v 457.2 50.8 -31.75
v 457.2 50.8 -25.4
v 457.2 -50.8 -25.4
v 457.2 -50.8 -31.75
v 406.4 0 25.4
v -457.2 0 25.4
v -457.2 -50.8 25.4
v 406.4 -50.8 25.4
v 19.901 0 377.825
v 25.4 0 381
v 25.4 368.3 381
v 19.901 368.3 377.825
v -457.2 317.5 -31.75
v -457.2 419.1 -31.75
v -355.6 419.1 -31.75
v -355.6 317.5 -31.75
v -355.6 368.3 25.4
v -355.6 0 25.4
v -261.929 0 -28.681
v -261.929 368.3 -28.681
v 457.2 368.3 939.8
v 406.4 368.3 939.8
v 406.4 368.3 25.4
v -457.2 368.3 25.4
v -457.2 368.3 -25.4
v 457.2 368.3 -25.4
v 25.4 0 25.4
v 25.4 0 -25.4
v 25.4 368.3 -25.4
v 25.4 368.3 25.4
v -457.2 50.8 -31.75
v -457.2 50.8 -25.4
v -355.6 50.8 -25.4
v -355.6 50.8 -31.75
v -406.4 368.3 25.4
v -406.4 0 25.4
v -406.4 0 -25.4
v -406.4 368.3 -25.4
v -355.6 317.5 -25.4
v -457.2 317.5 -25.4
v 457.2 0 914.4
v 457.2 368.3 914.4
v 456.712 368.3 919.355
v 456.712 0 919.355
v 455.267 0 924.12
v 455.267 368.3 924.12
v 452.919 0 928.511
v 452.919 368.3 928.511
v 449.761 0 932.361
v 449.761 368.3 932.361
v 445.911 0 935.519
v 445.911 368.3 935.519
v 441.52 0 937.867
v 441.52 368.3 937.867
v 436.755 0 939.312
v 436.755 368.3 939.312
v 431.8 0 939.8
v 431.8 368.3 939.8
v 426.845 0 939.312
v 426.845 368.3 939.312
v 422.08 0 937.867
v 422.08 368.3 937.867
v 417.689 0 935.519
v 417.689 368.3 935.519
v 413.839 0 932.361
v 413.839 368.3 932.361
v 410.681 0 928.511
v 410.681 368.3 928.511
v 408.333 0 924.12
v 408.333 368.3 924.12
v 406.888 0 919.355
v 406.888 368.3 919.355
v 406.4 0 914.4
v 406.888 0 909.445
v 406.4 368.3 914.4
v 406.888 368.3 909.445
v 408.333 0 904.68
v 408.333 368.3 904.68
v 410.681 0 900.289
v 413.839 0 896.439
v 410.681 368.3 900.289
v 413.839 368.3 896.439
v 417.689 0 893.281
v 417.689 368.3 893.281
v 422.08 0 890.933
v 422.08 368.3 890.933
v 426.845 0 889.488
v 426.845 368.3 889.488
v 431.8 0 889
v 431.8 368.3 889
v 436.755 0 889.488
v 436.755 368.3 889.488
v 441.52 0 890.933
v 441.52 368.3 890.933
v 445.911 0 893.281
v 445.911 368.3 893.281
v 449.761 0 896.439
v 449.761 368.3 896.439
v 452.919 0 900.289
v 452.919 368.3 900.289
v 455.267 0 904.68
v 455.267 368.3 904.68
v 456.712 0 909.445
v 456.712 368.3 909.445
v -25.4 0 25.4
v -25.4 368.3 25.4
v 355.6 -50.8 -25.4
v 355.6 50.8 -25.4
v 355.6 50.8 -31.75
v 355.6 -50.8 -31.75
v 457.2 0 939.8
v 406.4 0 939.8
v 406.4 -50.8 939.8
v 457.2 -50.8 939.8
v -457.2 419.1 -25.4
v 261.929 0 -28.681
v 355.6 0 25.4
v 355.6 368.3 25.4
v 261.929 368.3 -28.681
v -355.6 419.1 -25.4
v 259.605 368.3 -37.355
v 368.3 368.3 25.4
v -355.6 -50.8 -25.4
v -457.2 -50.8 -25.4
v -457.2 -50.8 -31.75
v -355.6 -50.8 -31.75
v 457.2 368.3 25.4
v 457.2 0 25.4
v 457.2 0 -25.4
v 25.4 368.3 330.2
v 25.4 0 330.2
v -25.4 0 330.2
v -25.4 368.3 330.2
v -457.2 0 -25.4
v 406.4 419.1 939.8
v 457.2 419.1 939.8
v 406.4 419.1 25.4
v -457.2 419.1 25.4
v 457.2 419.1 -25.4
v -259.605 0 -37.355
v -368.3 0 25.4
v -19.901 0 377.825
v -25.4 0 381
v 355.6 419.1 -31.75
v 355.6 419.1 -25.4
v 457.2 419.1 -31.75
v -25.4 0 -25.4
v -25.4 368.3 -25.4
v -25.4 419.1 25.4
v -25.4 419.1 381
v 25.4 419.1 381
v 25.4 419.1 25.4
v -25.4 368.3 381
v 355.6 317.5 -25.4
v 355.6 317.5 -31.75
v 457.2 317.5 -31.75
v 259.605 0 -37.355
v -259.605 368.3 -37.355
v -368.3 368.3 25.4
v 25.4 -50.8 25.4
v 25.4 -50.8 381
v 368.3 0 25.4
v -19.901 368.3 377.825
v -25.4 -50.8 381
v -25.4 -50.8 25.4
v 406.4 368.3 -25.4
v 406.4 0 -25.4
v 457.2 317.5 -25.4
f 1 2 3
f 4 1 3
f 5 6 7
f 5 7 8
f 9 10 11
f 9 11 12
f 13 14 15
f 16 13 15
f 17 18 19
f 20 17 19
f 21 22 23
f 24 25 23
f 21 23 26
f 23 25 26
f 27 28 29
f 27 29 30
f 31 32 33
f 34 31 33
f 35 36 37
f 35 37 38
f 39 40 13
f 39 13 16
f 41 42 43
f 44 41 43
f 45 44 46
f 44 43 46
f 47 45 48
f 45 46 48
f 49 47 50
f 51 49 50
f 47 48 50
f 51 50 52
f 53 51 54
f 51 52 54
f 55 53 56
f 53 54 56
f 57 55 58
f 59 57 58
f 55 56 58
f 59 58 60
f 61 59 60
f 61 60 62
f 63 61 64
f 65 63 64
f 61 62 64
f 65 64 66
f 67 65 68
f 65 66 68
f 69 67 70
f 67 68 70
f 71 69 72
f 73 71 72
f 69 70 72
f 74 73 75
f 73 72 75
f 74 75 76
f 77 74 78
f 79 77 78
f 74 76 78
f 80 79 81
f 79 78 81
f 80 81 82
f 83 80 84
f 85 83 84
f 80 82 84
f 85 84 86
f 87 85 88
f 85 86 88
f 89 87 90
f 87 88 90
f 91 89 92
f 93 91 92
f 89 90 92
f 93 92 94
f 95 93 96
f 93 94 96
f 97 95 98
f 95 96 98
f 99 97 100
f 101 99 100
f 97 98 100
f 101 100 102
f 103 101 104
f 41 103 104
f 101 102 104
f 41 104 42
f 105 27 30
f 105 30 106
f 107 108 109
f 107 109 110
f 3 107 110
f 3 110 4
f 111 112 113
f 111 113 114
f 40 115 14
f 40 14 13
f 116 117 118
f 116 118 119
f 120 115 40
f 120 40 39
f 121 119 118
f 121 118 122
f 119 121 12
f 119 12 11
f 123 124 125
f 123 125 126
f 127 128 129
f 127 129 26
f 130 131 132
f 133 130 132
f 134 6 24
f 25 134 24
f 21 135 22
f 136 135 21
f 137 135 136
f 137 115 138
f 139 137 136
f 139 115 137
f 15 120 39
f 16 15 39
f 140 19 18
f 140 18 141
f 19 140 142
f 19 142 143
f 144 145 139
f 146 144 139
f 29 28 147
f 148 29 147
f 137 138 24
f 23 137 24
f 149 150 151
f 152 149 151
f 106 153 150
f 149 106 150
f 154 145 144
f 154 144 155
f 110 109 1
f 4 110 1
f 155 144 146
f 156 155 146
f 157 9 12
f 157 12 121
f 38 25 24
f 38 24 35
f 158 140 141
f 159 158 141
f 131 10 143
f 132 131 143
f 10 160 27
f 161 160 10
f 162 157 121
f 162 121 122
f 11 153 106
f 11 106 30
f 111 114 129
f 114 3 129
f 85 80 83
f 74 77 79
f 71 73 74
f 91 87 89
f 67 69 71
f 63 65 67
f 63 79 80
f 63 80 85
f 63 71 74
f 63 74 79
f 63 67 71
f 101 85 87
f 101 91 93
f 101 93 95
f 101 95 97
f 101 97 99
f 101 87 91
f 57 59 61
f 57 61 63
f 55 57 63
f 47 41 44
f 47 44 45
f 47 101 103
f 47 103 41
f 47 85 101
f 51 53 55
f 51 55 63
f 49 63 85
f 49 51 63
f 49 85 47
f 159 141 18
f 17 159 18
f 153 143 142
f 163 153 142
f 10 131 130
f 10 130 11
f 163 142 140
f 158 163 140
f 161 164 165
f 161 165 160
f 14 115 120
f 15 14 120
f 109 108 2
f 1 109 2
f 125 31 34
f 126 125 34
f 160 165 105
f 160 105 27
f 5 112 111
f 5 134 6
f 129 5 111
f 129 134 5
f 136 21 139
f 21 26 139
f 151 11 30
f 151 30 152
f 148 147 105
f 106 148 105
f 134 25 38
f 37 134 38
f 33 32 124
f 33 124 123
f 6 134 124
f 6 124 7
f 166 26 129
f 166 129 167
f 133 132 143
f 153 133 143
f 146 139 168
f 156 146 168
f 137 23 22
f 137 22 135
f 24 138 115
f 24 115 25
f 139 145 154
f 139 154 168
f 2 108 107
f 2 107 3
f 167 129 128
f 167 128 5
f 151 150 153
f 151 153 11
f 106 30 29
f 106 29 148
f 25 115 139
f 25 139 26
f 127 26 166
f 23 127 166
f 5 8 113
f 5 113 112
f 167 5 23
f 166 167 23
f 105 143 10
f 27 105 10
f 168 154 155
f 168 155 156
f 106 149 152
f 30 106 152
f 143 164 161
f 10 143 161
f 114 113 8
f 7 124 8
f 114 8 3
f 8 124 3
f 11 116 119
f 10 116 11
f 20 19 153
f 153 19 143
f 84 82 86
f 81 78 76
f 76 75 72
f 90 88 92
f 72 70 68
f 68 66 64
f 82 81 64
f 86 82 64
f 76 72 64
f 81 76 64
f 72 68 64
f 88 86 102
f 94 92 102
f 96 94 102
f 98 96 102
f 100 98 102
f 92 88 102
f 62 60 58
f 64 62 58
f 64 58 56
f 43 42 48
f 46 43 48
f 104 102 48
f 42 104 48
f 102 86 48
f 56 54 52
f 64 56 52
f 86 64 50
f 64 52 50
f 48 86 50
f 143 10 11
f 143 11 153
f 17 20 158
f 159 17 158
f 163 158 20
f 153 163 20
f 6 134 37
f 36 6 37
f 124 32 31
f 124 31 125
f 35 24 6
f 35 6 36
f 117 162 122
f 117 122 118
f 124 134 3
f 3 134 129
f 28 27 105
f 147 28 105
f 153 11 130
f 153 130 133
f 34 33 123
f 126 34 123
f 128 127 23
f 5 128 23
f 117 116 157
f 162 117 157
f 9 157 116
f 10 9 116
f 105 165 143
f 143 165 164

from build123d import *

# Parameters (mm, degrees)
F0_W      = 914.4
F0_H      = 50.8
F1_DEPTH  = 50.8
F2_W      = 50.8
F2_H      = 355.6
F3_DEPTH  = 50.8
F5_DEPTH  = 368.3
F6_W      = 50.8
F6_H      = 368.3
F7_DEPTH  = 50.8
F8_W      = 50.8
F8_H      = 50.8
F9_DEPTH  = 914.4
F10_W     = 50.8
F10_H     = 50.8
F11_DEPTH = 368.3
F12_W     = 50.8
F12_H     = 50.8
F13_DEPTH = 368.3
F14_W     = 50.8
F14_H     = 50.8
F15_DEPTH = 355.6
F17_W     = 50.8
F17_H     = 50.8
F18_DEPTH = 914.4
F19_W     = 50.8
F19_H     = 50.8
F20_DEPTH = 914.4
F21_R     = 25.4
F22_DEPTH = 368.3
F23_W     = 101.6
F23_H     = 101.6
F24_DEPTH = 6.35
F25_W     = 101.6
F25_H     = 101.6
F26_DEPTH = 6.35


with BuildPart() as f1:
    # F0 (on Front) → F1 (new body)
    with BuildSketch(Plane.XZ):
        Rectangle(F0_W, F0_H)
    extrude(amount=F1_DEPTH)

    # F17 (on face) → F18 (join)
    with BuildSketch(Plane.XY.offset(25.4)):
        with Locations((431.8, -25.4)):
            Rectangle(F17_W, F17_H)
    extrude(amount=F18_DEPTH)


with BuildPart() as f3:
    # F2 (on face) → F3 (new body)
    with BuildSketch(Plane.XZ.offset(50.8)):
        with Locations((0, 203.2)):
            Rectangle(F2_W, F2_H)
    extrude(amount=-F3_DEPTH)


with BuildPart() as f5:
    # F4 (on face) → F5 (new body)
    with BuildSketch(Plane(origin=(0, 0, 0), x_dir=(-1, 0, 0), z_dir=(0, 1, 0))):
        Polygon((261.9293167929, -28.6807941648), (25.4, 381), (19.900738686, 377.825), (259.6050554788, -37.3550554788), (368.3, 25.4), (355.6, 25.4), align=None)
    extrude(amount=F5_DEPTH)


with BuildPart() as f7:
    # F6 (on face) → F7 (new body)
    with BuildSketch(Plane.XY.offset(25.4)):
        with Locations((-431.8, 184.15)):
            Rectangle(F6_W, F6_H)
    extrude(amount=-F7_DEPTH)


with BuildPart() as f9:
    # F8 (on face) → F9 (new body)
    with BuildSketch(Plane(origin=(-457.2, 0, 0), x_dir=(0, -1, 0), z_dir=(-1, 0, 0))):
        with Locations((-393.7, 0)):
            Rectangle(F8_W, F8_H)
    extrude(amount=-F9_DEPTH)

    # F19 (on face) → F20 (join)
    with BuildSketch(Plane.XY.offset(25.4)):
        with Locations((431.8, 393.7)):
            Rectangle(F19_W, F19_H)
    extrude(amount=F20_DEPTH)


with BuildPart() as f11:
    # F10 (on face) → F11 (new body)
    with BuildSketch(Plane(origin=(0, 0, 0), x_dir=(-1, 0, 0), z_dir=(0, 1, 0))):
        Rectangle(F10_W, F10_H)
    extrude(amount=F11_DEPTH)


with BuildPart() as f13:
    # F12 (on face) → F13 (new body)
    with BuildSketch(Plane(origin=(0, 0, 0), x_dir=(-1, 0, 0), z_dir=(0, 1, 0))):
        with Locations((0, 355.6)):
            Rectangle(F12_W, F12_H)
    extrude(amount=F13_DEPTH)


with BuildPart() as f15:
    # F14 (on face) → F15 (new body)
    with BuildSketch(Plane.XY.offset(25.4)):
        with Locations((0, 393.7)):
            Rectangle(F14_W, F14_H)
    extrude(amount=F15_DEPTH)


with BuildPart() as f16_1:
    # F16: instance of F5
    add(f5.part.mirror(Plane.YZ))


with BuildPart() as f16_2:
    # F16: instance of F7
    add(f7.part.mirror(Plane.YZ))


with BuildPart() as f22:
    # F21 (on face) → F22 (new body)
    with BuildSketch(Plane.XZ.offset(-368.3)):
        with Locations((431.8, 914.4)):
            Circle(F21_R)
    extrude(amount=F22_DEPTH)


with BuildPart() as f24:
    # F23 (on face) → F24 (new body)
    with BuildSketch(Plane(origin=(0, 0, -25.4), x_dir=(1, 0, 0), z_dir=(0, 0, -1))):
        with Locations((-406.4, 0)):
            Rectangle(F23_W, F23_H)
    extrude(amount=F24_DEPTH)


with BuildPart() as f24b:
    # F23 (on face) → F24, piece 2 (new body)
    with BuildSketch(Plane(origin=(0, 0, -25.4), x_dir=(1, 0, 0), z_dir=(0, 0, -1))):
        with Locations((406.4, 0)):
            Rectangle(F23_W, F23_H)
    extrude(amount=F24_DEPTH)


with BuildPart() as f26:
    # F25 (on face) → F26 (new body)
    with BuildSketch(Plane(origin=(0, 0, -25.4), x_dir=(1, 0, 0), z_dir=(0, 0, -1))):
        with Locations((-406.4, -368.3)):
            Rectangle(F25_W, F25_H)
    extrude(amount=F26_DEPTH)


with BuildPart() as f26b:
    # F25 (on face) → F26, piece 2 (new body)
    with BuildSketch(Plane(origin=(0, 0, -25.4), x_dir=(1, 0, 0), z_dir=(0, 0, -1))):
        with Locations((406.4, -368.3)):
            Rectangle(F25_W, F25_H)
    extrude(amount=F26_DEPTH)


solid = Compound([f1.part, f3.part, f5.part, f7.part, f9.part, f11.part, f13.part, f15.part, f16_1.part, f16_2.part, f22.part, f24.part, f24b.part, f26.part, f26b.part])
